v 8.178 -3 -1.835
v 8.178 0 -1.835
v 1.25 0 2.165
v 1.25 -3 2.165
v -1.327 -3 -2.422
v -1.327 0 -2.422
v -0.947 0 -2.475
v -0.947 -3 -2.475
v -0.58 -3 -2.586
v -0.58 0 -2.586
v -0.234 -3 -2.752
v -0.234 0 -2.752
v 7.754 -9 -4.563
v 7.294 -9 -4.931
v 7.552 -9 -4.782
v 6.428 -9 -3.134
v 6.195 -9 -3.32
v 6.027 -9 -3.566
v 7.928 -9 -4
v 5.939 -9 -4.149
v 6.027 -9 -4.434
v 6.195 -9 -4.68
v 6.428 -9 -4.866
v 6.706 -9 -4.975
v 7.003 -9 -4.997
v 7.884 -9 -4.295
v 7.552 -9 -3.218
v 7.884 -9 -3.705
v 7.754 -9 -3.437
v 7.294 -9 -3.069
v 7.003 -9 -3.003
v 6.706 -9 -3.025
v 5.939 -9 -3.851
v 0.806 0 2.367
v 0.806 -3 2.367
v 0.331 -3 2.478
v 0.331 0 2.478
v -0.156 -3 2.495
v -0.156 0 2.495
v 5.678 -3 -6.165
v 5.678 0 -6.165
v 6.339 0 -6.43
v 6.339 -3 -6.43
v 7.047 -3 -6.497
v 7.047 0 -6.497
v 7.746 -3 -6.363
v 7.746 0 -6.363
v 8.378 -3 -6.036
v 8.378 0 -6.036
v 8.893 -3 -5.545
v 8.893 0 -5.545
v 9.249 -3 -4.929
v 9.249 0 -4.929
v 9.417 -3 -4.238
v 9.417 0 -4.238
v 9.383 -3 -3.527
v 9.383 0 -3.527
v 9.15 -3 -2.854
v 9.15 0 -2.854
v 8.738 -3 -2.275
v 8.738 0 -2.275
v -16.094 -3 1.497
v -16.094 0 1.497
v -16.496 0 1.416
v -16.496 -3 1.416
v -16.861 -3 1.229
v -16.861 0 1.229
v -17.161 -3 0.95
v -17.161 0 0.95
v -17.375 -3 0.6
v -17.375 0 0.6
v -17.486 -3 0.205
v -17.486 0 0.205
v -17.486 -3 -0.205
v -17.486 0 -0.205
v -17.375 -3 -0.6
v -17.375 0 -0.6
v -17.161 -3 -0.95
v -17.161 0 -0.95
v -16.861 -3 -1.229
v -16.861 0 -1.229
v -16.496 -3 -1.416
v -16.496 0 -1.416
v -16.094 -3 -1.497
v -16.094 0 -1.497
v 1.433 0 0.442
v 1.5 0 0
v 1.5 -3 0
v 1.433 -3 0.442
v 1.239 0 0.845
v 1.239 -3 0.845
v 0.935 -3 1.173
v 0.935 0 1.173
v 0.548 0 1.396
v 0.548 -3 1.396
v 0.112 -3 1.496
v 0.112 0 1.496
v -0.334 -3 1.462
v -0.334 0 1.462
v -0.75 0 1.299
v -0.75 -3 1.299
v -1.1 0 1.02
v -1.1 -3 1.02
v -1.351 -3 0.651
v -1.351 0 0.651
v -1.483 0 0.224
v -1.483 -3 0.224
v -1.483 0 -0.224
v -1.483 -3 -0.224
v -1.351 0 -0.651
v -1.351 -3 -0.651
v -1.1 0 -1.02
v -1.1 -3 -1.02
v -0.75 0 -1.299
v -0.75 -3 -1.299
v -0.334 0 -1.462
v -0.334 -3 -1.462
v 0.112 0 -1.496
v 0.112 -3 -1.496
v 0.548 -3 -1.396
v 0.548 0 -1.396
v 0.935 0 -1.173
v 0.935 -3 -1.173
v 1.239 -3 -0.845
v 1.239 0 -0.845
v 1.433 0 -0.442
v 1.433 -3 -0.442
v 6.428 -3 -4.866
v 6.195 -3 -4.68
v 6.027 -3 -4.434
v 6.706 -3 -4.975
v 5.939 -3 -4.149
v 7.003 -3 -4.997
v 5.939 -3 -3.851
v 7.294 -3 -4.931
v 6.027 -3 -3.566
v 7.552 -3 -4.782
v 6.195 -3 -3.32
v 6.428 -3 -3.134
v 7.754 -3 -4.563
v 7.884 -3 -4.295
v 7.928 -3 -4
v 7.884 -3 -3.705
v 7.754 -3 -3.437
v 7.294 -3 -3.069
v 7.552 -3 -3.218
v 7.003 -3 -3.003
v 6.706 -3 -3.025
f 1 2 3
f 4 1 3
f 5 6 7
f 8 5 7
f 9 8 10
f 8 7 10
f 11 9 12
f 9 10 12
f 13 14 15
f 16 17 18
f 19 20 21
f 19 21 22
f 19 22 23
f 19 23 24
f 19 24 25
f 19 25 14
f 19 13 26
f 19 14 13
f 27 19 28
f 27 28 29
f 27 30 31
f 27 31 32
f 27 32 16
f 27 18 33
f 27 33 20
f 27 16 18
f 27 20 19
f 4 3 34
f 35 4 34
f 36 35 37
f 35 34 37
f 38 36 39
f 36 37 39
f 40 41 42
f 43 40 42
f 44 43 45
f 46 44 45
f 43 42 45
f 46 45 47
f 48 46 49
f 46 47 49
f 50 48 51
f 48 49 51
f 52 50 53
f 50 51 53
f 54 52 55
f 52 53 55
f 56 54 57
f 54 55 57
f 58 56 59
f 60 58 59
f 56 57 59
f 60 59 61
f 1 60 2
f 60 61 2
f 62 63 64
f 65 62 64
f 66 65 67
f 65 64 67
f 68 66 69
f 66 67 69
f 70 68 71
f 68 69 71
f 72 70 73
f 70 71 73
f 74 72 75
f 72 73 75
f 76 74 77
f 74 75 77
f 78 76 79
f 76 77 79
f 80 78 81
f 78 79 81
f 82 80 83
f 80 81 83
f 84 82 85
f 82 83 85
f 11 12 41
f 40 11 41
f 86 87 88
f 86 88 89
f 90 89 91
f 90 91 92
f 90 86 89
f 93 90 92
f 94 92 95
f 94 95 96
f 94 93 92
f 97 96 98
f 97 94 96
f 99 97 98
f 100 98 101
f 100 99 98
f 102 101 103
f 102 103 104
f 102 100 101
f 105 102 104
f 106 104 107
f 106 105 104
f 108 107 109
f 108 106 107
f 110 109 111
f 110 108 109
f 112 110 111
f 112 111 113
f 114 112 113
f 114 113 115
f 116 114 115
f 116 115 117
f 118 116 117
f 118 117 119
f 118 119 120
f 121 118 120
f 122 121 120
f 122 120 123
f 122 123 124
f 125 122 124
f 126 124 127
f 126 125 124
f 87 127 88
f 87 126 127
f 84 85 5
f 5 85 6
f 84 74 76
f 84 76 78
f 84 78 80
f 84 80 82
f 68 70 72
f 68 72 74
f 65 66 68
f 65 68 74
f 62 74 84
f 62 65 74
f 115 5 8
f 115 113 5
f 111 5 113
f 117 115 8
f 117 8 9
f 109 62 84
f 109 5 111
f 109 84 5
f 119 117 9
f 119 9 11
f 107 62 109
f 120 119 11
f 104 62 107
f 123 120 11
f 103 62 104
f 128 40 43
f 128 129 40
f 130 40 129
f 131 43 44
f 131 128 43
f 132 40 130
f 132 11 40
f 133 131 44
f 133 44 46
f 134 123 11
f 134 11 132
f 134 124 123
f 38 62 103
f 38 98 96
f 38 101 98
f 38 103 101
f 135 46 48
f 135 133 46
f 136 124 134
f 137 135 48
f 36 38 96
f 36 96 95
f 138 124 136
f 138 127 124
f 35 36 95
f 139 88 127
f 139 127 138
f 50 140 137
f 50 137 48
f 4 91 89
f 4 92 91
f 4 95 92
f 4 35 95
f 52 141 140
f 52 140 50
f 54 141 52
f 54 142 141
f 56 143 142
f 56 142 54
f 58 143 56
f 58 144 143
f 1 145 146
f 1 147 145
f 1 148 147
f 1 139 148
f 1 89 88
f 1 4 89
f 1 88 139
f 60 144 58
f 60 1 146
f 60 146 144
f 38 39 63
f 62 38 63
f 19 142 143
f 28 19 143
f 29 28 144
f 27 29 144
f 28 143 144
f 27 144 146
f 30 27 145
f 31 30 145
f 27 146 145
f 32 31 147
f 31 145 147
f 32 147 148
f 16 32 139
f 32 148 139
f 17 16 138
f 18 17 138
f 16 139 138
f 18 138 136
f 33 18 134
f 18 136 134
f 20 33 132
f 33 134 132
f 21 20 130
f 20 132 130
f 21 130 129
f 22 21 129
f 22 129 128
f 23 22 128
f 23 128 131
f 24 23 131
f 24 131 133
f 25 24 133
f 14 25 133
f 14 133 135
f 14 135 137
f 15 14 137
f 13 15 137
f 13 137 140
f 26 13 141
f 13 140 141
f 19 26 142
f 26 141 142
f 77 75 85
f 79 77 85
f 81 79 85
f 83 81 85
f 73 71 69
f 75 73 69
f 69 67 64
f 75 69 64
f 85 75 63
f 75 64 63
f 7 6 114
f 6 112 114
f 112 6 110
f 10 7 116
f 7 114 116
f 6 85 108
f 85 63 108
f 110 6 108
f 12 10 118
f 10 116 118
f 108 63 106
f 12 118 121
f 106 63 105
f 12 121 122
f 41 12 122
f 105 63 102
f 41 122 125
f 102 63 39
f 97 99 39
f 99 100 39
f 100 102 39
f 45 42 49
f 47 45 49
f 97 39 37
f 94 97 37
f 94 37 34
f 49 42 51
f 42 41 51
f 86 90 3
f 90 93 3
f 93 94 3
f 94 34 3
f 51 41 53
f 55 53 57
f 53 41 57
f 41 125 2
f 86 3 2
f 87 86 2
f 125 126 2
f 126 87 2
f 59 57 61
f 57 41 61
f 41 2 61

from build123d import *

# Parameters (mm, degrees)
F0_R     = 1.5
F1_DEPTH = 3
F2_R     = 1
F3_DEPTH = 6


with BuildPart() as f1:
    # F0 (on Front) → F1 (new body)
    with BuildSketch(Plane.XZ):
        with BuildLine():
            Line((8.178203, -1.834936), (1.25, 2.165064))
            ThreePointArc((1.25, 2.165064), (0.571231, 2.433864), (-0.15625, 2.495112))
            Line((-0.15625, 2.495112), (-16.09375, 1.497067))
            ThreePointArc((-16.09375, 1.497067), (-17.5, 0), (-16.09375, -1.497067))
            Line((-16.09375, -1.497067), (-1.327463, -2.421768))
            ThreePointArc((-1.327463, -2.421768), (-0.761482, -2.523477), (-0.233713, -2.751817))
            Line((-0.233713, -2.751817), (5.678203, -6.165064))
            ThreePointArc((5.678203, -6.165064), (9.093267, -5.25), (8.178203, -1.834936))
        make_face()
        Circle(F0_R, mode=Mode.SUBTRACT)
    extrude(amount=F1_DEPTH)

    # F2 (on face) → F3 (join)
    with BuildSketch(Plane.XZ.offset(3)):
        with Locations((6.928203, -4)):
            Circle(F2_R)
    extrude(amount=F3_DEPTH)


solid = f1.part
